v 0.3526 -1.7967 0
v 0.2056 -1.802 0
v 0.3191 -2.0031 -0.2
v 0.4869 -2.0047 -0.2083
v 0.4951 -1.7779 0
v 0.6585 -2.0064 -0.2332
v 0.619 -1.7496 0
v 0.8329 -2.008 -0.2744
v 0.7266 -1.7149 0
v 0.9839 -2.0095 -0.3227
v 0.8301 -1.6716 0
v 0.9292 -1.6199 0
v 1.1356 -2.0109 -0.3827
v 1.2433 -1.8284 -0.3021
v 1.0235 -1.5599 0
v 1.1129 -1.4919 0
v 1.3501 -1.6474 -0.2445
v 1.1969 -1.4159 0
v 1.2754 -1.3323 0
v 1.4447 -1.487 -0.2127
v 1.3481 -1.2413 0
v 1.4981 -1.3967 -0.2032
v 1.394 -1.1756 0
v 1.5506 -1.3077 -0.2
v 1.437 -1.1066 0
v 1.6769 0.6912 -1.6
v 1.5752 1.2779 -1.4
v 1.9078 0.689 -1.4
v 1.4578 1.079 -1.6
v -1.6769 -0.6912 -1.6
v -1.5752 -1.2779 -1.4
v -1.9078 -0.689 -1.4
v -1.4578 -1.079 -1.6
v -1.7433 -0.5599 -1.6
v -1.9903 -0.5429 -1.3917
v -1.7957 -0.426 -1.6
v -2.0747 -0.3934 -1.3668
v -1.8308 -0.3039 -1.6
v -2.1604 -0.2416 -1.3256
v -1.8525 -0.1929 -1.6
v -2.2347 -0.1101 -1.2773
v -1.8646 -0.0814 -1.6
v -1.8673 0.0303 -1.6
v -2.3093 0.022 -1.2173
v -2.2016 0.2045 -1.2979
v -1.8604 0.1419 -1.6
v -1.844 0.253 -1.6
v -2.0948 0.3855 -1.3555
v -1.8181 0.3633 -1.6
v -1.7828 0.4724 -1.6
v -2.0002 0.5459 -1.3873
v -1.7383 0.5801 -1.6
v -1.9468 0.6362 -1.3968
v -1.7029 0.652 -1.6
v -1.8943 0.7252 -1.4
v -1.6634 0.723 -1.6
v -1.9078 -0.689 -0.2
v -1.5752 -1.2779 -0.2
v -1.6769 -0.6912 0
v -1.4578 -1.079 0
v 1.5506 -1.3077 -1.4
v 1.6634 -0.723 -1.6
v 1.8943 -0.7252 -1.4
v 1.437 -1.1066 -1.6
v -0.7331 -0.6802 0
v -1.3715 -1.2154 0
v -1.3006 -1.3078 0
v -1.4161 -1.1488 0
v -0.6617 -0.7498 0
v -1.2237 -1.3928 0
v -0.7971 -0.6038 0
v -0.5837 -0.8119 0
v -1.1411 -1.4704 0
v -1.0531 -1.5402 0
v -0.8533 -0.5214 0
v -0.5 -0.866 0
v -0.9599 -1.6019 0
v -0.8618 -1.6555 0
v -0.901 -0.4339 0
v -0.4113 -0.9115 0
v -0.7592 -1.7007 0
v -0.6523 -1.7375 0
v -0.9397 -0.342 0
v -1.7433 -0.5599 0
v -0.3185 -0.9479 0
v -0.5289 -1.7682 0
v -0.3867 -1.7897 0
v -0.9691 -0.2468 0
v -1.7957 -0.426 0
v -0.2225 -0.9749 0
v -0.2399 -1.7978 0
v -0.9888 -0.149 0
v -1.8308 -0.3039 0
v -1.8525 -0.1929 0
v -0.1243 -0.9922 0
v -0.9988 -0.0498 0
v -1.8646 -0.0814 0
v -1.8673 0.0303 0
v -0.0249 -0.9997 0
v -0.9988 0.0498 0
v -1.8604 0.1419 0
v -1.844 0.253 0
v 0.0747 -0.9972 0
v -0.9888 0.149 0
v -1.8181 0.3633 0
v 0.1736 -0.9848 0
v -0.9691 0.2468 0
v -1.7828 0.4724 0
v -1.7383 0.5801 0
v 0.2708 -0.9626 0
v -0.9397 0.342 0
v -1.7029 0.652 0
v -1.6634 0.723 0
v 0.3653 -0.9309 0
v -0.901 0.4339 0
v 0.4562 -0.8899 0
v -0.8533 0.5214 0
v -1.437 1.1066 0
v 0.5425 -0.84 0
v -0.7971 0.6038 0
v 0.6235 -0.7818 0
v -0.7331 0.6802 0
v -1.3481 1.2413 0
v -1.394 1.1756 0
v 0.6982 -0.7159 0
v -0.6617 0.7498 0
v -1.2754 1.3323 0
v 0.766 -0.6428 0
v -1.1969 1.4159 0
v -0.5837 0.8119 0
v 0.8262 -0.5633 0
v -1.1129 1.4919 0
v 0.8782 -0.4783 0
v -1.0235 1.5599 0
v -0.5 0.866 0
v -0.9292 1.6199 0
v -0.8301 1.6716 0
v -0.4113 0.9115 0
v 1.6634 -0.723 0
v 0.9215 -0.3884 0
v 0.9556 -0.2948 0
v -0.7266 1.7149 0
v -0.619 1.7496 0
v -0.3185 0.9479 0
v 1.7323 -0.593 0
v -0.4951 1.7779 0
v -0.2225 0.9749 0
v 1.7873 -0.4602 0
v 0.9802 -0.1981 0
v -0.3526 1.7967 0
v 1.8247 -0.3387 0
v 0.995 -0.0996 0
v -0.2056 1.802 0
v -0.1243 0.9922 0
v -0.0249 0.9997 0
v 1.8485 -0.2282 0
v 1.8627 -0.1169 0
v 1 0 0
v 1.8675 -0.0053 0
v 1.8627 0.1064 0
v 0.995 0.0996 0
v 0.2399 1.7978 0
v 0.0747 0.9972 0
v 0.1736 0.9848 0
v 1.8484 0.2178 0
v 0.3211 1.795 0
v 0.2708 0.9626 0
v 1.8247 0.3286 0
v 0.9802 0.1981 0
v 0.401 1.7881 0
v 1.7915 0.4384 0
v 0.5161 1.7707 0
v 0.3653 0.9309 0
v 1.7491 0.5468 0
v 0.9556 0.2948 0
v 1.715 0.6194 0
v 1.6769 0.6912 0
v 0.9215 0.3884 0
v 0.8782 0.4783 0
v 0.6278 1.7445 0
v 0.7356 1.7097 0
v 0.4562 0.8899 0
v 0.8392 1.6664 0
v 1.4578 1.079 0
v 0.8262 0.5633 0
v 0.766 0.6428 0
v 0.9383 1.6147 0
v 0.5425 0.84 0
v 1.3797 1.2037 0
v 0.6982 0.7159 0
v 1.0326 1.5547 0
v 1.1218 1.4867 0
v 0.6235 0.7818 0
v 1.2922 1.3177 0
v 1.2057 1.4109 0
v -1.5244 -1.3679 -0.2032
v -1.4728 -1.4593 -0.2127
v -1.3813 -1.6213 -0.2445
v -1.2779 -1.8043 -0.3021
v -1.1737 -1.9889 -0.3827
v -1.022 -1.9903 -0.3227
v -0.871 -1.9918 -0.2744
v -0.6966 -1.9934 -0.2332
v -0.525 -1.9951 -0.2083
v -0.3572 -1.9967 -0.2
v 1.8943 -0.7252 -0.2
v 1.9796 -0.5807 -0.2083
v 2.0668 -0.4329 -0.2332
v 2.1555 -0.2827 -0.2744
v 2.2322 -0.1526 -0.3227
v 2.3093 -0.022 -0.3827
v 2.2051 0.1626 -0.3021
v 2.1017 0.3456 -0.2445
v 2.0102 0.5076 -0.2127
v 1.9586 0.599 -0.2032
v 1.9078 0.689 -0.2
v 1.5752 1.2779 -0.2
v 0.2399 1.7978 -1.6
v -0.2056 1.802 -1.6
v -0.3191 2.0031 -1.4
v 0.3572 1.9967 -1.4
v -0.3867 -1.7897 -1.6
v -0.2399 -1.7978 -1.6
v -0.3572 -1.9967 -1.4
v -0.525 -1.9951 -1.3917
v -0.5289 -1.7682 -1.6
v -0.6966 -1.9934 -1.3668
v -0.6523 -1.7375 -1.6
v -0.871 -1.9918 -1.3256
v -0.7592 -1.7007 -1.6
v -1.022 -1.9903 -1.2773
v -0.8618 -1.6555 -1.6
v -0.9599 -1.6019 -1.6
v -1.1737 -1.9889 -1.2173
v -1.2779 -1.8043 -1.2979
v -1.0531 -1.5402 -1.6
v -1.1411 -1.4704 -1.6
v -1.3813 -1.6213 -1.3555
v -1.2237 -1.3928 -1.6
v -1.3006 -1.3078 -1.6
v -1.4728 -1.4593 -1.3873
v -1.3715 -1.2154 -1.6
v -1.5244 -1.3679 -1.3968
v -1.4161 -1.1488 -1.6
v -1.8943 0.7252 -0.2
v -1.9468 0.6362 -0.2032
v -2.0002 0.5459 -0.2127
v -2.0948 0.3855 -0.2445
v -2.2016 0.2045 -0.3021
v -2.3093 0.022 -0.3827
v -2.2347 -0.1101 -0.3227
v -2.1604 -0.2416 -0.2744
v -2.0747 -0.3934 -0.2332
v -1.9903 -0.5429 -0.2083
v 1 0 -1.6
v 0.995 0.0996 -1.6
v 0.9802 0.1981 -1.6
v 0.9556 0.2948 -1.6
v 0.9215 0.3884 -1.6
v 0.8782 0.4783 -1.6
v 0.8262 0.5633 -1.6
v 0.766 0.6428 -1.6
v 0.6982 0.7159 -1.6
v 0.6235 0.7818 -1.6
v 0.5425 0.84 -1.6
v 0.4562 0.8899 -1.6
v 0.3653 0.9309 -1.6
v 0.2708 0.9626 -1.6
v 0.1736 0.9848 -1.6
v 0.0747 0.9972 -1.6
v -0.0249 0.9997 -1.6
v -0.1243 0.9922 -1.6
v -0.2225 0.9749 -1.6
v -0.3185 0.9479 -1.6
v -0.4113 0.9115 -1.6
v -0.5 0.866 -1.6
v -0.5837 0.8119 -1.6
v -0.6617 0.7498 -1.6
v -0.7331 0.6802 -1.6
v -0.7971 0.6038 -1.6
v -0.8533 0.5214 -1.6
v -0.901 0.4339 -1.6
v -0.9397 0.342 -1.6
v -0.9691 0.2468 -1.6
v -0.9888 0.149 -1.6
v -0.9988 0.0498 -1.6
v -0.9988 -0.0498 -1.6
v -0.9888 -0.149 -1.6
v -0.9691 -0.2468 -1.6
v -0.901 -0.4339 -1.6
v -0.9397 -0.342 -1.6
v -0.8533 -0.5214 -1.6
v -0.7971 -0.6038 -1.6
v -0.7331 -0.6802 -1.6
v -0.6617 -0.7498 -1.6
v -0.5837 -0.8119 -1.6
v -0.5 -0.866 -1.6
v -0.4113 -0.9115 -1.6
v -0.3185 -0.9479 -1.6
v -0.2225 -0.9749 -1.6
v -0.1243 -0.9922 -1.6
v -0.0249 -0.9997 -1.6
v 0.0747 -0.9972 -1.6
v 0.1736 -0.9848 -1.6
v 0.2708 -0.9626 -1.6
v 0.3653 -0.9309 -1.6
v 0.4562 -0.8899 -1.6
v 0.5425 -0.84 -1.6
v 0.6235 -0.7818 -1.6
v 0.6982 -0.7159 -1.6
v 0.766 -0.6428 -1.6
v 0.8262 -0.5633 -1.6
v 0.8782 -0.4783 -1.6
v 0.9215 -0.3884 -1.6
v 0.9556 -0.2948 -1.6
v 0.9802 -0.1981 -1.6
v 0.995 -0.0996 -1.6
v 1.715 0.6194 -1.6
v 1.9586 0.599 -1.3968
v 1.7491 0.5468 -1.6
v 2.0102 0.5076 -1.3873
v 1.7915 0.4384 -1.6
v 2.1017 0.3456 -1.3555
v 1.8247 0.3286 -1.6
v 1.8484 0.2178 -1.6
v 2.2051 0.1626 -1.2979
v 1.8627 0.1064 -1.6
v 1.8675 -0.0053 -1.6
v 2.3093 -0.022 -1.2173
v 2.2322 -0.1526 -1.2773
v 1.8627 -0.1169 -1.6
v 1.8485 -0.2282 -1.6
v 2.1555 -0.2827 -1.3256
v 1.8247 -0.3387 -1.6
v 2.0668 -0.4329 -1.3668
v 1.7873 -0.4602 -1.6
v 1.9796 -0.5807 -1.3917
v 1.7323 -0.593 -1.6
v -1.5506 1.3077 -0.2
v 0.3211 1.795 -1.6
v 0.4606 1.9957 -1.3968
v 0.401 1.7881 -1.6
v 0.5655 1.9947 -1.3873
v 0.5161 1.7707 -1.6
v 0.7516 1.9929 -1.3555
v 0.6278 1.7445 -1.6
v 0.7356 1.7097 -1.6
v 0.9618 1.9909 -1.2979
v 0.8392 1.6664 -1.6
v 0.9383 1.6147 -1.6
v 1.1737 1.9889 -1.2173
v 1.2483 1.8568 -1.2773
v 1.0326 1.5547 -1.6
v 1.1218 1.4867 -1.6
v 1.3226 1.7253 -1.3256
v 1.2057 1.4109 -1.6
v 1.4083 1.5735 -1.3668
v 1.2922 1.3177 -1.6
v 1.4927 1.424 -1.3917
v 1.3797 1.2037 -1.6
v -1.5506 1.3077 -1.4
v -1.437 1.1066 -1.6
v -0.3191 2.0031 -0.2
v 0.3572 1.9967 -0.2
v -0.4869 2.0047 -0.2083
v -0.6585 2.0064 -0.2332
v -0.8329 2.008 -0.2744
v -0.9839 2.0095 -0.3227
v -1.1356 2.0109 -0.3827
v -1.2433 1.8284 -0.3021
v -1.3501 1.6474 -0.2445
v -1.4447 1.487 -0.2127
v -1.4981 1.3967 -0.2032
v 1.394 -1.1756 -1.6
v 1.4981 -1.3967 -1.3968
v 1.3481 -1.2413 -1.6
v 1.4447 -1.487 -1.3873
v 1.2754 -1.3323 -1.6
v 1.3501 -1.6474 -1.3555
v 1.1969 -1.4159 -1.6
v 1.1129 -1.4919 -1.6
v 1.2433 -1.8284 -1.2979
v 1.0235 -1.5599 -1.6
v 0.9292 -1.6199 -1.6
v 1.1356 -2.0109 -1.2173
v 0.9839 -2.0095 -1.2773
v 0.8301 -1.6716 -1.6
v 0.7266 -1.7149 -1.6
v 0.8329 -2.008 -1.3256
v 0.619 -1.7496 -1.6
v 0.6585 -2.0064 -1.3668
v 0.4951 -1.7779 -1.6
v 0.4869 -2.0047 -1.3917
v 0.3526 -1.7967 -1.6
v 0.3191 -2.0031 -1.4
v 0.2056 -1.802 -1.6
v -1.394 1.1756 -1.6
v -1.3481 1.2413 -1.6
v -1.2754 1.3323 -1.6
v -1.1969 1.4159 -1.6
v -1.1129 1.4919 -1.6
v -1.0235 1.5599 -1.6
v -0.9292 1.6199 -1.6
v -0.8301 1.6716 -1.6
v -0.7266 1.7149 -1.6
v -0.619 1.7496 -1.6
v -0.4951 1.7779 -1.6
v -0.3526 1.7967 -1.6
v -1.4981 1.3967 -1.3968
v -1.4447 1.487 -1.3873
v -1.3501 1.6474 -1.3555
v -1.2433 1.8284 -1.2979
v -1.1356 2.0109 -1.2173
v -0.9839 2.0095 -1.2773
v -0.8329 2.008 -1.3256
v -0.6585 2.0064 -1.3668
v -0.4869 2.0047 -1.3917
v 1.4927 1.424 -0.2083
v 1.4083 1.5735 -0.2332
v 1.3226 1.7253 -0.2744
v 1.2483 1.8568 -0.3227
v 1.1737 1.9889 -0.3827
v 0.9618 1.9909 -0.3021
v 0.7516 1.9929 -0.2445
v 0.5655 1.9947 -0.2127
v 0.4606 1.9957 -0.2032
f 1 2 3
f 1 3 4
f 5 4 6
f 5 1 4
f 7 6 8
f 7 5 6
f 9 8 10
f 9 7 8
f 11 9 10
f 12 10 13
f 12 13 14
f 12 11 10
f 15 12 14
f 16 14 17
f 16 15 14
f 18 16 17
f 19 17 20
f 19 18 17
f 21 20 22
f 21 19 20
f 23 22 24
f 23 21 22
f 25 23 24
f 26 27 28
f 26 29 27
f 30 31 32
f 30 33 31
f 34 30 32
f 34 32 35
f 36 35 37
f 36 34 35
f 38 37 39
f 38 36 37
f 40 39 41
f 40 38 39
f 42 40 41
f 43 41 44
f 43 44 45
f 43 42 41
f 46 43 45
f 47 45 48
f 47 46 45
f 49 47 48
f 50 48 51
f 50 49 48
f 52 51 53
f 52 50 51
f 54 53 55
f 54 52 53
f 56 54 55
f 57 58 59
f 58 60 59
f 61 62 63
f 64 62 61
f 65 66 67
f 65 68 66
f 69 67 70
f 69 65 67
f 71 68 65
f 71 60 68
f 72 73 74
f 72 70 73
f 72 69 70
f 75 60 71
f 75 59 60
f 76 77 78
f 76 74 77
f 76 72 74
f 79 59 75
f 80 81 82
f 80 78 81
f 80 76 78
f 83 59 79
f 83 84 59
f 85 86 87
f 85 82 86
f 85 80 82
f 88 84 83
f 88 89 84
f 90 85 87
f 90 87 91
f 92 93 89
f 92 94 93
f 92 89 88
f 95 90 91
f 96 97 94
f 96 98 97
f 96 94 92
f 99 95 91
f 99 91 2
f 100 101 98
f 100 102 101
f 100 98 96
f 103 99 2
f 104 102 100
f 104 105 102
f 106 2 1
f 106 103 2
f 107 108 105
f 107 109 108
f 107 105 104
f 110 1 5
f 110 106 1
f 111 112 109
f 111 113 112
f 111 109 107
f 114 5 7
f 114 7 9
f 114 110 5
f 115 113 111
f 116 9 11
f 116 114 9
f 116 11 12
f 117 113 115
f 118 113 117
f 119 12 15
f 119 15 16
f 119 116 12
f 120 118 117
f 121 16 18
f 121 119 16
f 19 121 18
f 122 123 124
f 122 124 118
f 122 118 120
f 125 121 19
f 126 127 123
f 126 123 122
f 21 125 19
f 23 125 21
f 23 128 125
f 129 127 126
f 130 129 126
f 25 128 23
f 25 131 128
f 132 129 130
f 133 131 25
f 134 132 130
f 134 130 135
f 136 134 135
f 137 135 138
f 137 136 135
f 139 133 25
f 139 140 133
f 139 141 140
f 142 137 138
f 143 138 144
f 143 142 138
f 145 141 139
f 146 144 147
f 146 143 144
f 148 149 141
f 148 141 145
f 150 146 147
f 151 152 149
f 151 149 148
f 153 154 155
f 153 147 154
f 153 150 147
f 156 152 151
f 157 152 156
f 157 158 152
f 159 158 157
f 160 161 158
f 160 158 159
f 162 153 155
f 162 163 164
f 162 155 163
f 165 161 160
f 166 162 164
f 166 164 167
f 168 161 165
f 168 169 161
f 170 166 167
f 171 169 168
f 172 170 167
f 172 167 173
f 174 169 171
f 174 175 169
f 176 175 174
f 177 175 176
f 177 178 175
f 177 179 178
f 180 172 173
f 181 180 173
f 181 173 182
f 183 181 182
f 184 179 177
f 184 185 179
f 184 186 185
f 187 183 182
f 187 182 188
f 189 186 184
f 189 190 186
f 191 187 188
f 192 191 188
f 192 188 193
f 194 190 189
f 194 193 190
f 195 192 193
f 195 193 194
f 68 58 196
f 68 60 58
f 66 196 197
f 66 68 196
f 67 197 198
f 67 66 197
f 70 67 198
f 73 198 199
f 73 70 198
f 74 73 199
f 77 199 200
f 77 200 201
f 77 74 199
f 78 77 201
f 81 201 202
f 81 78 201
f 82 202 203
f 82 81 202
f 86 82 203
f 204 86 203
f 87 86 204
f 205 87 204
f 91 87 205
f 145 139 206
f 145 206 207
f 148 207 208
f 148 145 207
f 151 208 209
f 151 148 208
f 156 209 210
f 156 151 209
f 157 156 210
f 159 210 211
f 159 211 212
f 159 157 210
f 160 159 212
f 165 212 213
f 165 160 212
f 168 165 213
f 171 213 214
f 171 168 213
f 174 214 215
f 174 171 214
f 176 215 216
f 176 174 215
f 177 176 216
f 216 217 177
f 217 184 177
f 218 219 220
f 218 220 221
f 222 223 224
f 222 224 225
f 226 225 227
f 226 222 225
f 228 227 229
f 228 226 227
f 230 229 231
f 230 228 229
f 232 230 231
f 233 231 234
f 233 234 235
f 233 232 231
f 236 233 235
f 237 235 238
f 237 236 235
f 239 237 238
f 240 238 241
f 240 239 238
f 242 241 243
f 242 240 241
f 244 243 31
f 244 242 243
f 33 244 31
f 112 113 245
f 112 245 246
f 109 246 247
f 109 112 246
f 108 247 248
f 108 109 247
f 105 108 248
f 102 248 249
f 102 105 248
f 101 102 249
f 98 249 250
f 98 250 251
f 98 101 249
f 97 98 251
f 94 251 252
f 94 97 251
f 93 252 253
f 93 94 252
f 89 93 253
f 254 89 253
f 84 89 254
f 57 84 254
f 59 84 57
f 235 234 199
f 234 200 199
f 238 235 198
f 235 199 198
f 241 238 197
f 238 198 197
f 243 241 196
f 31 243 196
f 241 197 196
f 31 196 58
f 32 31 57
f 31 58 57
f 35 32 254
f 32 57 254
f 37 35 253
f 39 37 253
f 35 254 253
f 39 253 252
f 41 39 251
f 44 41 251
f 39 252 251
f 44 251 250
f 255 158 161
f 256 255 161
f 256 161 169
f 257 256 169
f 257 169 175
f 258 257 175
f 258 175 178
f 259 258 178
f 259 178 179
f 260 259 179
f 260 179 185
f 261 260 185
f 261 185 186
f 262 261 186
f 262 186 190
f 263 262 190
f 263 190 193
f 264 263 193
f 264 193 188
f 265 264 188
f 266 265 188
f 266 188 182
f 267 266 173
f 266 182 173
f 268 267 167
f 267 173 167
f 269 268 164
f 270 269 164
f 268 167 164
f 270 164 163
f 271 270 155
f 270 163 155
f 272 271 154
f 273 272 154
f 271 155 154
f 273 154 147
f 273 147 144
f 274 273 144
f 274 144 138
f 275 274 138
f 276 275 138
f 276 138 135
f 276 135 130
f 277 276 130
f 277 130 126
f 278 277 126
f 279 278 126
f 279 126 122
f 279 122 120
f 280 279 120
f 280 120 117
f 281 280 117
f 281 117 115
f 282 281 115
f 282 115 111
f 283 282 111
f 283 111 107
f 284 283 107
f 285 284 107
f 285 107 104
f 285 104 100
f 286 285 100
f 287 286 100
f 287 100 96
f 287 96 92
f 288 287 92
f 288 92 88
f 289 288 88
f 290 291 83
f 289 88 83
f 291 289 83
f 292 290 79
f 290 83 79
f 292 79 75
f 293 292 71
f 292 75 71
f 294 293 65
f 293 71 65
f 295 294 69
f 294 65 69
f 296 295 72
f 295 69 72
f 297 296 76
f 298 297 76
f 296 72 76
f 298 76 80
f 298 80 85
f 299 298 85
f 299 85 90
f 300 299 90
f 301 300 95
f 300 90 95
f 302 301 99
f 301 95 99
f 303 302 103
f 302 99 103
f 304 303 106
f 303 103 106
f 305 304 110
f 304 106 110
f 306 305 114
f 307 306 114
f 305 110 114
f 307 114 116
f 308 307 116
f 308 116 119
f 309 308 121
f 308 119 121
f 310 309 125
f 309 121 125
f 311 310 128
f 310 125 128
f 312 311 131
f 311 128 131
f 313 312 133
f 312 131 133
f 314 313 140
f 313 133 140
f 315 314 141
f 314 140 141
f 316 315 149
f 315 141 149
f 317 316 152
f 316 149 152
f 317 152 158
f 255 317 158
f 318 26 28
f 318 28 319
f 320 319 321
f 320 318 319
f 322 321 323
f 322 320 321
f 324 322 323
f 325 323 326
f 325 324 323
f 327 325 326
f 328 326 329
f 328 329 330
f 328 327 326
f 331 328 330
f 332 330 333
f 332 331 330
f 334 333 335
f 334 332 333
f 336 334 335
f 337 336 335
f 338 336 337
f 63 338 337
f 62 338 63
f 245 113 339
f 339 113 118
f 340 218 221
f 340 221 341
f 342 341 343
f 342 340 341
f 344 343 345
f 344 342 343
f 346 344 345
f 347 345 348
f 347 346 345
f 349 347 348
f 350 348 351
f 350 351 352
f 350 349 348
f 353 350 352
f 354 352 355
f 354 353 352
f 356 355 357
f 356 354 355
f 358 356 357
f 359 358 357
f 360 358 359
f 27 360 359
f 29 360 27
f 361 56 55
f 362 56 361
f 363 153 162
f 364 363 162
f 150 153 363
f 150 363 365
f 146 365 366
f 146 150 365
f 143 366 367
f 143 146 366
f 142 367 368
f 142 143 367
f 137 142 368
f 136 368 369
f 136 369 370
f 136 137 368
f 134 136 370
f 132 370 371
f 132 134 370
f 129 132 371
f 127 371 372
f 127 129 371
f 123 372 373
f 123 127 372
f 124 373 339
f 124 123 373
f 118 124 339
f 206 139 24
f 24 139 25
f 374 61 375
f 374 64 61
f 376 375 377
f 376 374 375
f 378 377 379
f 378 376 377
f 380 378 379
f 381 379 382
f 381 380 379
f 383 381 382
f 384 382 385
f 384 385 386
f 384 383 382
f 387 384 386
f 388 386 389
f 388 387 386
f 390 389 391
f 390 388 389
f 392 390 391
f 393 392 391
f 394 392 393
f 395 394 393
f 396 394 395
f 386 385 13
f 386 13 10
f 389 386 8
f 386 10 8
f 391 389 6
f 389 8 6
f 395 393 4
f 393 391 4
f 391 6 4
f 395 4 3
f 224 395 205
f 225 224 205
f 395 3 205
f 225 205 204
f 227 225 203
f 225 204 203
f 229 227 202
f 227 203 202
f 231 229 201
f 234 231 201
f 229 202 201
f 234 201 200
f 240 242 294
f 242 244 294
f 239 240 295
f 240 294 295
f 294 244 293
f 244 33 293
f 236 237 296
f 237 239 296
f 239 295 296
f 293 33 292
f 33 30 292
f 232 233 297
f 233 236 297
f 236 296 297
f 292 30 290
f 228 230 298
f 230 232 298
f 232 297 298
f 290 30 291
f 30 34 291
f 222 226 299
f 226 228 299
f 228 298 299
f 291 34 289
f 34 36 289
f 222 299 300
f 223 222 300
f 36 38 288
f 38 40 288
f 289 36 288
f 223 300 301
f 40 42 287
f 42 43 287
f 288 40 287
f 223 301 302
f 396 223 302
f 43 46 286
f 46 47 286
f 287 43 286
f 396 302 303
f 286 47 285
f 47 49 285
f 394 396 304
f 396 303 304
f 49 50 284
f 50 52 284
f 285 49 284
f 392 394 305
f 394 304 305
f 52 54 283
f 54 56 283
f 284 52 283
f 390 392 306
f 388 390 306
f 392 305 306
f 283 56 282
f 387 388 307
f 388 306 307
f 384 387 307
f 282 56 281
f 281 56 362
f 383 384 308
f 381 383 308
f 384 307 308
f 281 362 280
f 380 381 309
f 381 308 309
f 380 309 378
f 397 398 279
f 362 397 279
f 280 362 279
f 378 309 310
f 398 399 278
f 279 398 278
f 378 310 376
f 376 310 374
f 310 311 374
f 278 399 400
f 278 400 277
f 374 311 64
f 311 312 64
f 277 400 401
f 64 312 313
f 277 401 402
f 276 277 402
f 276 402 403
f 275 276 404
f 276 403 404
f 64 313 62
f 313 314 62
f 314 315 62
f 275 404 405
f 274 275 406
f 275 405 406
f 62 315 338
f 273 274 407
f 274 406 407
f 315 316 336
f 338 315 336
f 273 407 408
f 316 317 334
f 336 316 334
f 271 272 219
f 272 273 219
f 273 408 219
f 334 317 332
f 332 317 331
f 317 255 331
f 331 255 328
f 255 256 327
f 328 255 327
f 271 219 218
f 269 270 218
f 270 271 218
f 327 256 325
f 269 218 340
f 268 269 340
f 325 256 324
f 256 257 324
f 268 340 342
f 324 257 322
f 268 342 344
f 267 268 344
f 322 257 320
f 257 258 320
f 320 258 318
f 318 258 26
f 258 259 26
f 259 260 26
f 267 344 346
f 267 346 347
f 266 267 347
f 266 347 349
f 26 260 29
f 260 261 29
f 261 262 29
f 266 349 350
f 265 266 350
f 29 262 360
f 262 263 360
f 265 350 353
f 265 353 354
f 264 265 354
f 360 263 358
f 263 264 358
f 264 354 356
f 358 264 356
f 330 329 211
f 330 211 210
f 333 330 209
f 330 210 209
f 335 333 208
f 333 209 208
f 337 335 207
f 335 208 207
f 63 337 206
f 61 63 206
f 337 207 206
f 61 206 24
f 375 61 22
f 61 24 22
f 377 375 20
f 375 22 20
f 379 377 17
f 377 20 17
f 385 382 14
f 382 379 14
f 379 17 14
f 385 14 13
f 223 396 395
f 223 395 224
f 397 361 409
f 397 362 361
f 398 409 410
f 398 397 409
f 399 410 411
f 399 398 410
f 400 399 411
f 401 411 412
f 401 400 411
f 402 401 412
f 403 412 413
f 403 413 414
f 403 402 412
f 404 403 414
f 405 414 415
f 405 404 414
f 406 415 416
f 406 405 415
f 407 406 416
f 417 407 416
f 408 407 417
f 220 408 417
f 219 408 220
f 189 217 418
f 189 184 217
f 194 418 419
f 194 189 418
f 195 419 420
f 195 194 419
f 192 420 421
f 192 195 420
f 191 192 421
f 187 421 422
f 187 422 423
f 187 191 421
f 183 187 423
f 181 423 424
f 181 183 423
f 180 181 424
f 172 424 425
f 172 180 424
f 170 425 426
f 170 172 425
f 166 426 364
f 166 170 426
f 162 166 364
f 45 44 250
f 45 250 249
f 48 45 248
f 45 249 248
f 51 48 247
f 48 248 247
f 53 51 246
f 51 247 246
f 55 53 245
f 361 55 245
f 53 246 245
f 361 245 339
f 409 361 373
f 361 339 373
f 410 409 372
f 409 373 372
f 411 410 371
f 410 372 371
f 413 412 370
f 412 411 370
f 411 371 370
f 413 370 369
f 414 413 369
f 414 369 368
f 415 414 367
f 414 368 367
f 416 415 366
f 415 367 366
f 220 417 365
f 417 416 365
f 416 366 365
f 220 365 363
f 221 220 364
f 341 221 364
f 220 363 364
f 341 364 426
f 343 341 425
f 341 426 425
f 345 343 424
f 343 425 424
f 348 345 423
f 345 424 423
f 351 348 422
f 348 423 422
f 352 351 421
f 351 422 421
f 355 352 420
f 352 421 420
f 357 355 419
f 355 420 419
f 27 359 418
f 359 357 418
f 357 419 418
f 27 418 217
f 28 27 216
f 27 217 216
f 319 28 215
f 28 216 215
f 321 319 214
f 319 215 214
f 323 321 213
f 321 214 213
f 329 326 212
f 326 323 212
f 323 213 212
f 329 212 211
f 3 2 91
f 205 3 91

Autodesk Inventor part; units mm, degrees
ref_plane "YZ Plane" through (0, 0, 0) normal (1, 0, 0) x (0, 1, 0)
ref_plane "XZ Plane" through (0, 0, 0) normal (0, 1, 0) x (-1, 0, 0)
ref_plane "XY Plane" through (0, 0, 0) normal (0, 0, 1) x (1, 0, 0)
sketch "Sketch1" plane through (0, 0, 0) normal (0, 0, 1) x (1, 0, 0)
  line L0 (1.1356, -2.0109) -> (-1.1737, -1.9889)
  line L1 (-1.1737, -1.9889) -> (-2.3093, 0.022)
  line L2 (-2.3093, 0.022) -> (-1.1356, 2.0109)
  line L3 (-1.1356, 2.0109) -> (1.1737, 1.9889)
  line L4 (1.1737, 1.9889) -> (2.3093, -0.022)
  line L5 (2.3093, -0.022) -> (1.1356, -2.0109)
  point P0 (0, 0)
  point P1 (0, 0)
  dimension "d0" = 4
extrude "Extrusion1" add sketch "Sketch1" against normal blind 1.6
chamfer "Chamfer1" distance 0.2 angle 45 12 edges at (1.7415, 0.9834, 0) (0.0191, 1.9999, 0) (-1.7224, 1.0165, 0) (-1.7415, -0.9834, 0) (-0.0191, -1.9999, 0) (1.7224, -1.0165, 0) (1.7224, -1.0165, -1.6) (1.7415, 0.9834, -1.6) (0.0191, 1.9999, -1.6) (-1.7224, 1.0165, -1.6) (-1.7415, -0.9834, -1.6) (-0.0191, -1.9999, -1.6)
fillet "Fillet1" radius 2 12 edges at (-2.1938, 0.0209, -1.5) (-1.0788, 1.9104, -1.5) (1.115, 1.8895, -1.5) (2.1938, -0.0209, -1.5) (1.0788, -1.9104, -1.5) (-1.115, -1.8895, -1.5) (-1.115, -1.8895, -0.1) (-2.1938, 0.0209, -0.1) (-1.0788, 1.9104, -0.1) (1.115, 1.8895, -0.1) (2.1938, -0.0209, -0.1) (1.0788, -1.9104, -0.1)
sketch "Sketch2" plane through (0, 0, 0) normal (0, 0, 1) x (1, 0, 0)
  circle A0 centre (0, 0) radius 1
  dimension "d7" = 2
extrude "Extrusion2" cut sketch "Sketch2" against normal through all
thread "Thread1" size "M2x0.4" class "6H" standard "ANSI Metric M Profile" full length
properties part number "M2 Nut"
